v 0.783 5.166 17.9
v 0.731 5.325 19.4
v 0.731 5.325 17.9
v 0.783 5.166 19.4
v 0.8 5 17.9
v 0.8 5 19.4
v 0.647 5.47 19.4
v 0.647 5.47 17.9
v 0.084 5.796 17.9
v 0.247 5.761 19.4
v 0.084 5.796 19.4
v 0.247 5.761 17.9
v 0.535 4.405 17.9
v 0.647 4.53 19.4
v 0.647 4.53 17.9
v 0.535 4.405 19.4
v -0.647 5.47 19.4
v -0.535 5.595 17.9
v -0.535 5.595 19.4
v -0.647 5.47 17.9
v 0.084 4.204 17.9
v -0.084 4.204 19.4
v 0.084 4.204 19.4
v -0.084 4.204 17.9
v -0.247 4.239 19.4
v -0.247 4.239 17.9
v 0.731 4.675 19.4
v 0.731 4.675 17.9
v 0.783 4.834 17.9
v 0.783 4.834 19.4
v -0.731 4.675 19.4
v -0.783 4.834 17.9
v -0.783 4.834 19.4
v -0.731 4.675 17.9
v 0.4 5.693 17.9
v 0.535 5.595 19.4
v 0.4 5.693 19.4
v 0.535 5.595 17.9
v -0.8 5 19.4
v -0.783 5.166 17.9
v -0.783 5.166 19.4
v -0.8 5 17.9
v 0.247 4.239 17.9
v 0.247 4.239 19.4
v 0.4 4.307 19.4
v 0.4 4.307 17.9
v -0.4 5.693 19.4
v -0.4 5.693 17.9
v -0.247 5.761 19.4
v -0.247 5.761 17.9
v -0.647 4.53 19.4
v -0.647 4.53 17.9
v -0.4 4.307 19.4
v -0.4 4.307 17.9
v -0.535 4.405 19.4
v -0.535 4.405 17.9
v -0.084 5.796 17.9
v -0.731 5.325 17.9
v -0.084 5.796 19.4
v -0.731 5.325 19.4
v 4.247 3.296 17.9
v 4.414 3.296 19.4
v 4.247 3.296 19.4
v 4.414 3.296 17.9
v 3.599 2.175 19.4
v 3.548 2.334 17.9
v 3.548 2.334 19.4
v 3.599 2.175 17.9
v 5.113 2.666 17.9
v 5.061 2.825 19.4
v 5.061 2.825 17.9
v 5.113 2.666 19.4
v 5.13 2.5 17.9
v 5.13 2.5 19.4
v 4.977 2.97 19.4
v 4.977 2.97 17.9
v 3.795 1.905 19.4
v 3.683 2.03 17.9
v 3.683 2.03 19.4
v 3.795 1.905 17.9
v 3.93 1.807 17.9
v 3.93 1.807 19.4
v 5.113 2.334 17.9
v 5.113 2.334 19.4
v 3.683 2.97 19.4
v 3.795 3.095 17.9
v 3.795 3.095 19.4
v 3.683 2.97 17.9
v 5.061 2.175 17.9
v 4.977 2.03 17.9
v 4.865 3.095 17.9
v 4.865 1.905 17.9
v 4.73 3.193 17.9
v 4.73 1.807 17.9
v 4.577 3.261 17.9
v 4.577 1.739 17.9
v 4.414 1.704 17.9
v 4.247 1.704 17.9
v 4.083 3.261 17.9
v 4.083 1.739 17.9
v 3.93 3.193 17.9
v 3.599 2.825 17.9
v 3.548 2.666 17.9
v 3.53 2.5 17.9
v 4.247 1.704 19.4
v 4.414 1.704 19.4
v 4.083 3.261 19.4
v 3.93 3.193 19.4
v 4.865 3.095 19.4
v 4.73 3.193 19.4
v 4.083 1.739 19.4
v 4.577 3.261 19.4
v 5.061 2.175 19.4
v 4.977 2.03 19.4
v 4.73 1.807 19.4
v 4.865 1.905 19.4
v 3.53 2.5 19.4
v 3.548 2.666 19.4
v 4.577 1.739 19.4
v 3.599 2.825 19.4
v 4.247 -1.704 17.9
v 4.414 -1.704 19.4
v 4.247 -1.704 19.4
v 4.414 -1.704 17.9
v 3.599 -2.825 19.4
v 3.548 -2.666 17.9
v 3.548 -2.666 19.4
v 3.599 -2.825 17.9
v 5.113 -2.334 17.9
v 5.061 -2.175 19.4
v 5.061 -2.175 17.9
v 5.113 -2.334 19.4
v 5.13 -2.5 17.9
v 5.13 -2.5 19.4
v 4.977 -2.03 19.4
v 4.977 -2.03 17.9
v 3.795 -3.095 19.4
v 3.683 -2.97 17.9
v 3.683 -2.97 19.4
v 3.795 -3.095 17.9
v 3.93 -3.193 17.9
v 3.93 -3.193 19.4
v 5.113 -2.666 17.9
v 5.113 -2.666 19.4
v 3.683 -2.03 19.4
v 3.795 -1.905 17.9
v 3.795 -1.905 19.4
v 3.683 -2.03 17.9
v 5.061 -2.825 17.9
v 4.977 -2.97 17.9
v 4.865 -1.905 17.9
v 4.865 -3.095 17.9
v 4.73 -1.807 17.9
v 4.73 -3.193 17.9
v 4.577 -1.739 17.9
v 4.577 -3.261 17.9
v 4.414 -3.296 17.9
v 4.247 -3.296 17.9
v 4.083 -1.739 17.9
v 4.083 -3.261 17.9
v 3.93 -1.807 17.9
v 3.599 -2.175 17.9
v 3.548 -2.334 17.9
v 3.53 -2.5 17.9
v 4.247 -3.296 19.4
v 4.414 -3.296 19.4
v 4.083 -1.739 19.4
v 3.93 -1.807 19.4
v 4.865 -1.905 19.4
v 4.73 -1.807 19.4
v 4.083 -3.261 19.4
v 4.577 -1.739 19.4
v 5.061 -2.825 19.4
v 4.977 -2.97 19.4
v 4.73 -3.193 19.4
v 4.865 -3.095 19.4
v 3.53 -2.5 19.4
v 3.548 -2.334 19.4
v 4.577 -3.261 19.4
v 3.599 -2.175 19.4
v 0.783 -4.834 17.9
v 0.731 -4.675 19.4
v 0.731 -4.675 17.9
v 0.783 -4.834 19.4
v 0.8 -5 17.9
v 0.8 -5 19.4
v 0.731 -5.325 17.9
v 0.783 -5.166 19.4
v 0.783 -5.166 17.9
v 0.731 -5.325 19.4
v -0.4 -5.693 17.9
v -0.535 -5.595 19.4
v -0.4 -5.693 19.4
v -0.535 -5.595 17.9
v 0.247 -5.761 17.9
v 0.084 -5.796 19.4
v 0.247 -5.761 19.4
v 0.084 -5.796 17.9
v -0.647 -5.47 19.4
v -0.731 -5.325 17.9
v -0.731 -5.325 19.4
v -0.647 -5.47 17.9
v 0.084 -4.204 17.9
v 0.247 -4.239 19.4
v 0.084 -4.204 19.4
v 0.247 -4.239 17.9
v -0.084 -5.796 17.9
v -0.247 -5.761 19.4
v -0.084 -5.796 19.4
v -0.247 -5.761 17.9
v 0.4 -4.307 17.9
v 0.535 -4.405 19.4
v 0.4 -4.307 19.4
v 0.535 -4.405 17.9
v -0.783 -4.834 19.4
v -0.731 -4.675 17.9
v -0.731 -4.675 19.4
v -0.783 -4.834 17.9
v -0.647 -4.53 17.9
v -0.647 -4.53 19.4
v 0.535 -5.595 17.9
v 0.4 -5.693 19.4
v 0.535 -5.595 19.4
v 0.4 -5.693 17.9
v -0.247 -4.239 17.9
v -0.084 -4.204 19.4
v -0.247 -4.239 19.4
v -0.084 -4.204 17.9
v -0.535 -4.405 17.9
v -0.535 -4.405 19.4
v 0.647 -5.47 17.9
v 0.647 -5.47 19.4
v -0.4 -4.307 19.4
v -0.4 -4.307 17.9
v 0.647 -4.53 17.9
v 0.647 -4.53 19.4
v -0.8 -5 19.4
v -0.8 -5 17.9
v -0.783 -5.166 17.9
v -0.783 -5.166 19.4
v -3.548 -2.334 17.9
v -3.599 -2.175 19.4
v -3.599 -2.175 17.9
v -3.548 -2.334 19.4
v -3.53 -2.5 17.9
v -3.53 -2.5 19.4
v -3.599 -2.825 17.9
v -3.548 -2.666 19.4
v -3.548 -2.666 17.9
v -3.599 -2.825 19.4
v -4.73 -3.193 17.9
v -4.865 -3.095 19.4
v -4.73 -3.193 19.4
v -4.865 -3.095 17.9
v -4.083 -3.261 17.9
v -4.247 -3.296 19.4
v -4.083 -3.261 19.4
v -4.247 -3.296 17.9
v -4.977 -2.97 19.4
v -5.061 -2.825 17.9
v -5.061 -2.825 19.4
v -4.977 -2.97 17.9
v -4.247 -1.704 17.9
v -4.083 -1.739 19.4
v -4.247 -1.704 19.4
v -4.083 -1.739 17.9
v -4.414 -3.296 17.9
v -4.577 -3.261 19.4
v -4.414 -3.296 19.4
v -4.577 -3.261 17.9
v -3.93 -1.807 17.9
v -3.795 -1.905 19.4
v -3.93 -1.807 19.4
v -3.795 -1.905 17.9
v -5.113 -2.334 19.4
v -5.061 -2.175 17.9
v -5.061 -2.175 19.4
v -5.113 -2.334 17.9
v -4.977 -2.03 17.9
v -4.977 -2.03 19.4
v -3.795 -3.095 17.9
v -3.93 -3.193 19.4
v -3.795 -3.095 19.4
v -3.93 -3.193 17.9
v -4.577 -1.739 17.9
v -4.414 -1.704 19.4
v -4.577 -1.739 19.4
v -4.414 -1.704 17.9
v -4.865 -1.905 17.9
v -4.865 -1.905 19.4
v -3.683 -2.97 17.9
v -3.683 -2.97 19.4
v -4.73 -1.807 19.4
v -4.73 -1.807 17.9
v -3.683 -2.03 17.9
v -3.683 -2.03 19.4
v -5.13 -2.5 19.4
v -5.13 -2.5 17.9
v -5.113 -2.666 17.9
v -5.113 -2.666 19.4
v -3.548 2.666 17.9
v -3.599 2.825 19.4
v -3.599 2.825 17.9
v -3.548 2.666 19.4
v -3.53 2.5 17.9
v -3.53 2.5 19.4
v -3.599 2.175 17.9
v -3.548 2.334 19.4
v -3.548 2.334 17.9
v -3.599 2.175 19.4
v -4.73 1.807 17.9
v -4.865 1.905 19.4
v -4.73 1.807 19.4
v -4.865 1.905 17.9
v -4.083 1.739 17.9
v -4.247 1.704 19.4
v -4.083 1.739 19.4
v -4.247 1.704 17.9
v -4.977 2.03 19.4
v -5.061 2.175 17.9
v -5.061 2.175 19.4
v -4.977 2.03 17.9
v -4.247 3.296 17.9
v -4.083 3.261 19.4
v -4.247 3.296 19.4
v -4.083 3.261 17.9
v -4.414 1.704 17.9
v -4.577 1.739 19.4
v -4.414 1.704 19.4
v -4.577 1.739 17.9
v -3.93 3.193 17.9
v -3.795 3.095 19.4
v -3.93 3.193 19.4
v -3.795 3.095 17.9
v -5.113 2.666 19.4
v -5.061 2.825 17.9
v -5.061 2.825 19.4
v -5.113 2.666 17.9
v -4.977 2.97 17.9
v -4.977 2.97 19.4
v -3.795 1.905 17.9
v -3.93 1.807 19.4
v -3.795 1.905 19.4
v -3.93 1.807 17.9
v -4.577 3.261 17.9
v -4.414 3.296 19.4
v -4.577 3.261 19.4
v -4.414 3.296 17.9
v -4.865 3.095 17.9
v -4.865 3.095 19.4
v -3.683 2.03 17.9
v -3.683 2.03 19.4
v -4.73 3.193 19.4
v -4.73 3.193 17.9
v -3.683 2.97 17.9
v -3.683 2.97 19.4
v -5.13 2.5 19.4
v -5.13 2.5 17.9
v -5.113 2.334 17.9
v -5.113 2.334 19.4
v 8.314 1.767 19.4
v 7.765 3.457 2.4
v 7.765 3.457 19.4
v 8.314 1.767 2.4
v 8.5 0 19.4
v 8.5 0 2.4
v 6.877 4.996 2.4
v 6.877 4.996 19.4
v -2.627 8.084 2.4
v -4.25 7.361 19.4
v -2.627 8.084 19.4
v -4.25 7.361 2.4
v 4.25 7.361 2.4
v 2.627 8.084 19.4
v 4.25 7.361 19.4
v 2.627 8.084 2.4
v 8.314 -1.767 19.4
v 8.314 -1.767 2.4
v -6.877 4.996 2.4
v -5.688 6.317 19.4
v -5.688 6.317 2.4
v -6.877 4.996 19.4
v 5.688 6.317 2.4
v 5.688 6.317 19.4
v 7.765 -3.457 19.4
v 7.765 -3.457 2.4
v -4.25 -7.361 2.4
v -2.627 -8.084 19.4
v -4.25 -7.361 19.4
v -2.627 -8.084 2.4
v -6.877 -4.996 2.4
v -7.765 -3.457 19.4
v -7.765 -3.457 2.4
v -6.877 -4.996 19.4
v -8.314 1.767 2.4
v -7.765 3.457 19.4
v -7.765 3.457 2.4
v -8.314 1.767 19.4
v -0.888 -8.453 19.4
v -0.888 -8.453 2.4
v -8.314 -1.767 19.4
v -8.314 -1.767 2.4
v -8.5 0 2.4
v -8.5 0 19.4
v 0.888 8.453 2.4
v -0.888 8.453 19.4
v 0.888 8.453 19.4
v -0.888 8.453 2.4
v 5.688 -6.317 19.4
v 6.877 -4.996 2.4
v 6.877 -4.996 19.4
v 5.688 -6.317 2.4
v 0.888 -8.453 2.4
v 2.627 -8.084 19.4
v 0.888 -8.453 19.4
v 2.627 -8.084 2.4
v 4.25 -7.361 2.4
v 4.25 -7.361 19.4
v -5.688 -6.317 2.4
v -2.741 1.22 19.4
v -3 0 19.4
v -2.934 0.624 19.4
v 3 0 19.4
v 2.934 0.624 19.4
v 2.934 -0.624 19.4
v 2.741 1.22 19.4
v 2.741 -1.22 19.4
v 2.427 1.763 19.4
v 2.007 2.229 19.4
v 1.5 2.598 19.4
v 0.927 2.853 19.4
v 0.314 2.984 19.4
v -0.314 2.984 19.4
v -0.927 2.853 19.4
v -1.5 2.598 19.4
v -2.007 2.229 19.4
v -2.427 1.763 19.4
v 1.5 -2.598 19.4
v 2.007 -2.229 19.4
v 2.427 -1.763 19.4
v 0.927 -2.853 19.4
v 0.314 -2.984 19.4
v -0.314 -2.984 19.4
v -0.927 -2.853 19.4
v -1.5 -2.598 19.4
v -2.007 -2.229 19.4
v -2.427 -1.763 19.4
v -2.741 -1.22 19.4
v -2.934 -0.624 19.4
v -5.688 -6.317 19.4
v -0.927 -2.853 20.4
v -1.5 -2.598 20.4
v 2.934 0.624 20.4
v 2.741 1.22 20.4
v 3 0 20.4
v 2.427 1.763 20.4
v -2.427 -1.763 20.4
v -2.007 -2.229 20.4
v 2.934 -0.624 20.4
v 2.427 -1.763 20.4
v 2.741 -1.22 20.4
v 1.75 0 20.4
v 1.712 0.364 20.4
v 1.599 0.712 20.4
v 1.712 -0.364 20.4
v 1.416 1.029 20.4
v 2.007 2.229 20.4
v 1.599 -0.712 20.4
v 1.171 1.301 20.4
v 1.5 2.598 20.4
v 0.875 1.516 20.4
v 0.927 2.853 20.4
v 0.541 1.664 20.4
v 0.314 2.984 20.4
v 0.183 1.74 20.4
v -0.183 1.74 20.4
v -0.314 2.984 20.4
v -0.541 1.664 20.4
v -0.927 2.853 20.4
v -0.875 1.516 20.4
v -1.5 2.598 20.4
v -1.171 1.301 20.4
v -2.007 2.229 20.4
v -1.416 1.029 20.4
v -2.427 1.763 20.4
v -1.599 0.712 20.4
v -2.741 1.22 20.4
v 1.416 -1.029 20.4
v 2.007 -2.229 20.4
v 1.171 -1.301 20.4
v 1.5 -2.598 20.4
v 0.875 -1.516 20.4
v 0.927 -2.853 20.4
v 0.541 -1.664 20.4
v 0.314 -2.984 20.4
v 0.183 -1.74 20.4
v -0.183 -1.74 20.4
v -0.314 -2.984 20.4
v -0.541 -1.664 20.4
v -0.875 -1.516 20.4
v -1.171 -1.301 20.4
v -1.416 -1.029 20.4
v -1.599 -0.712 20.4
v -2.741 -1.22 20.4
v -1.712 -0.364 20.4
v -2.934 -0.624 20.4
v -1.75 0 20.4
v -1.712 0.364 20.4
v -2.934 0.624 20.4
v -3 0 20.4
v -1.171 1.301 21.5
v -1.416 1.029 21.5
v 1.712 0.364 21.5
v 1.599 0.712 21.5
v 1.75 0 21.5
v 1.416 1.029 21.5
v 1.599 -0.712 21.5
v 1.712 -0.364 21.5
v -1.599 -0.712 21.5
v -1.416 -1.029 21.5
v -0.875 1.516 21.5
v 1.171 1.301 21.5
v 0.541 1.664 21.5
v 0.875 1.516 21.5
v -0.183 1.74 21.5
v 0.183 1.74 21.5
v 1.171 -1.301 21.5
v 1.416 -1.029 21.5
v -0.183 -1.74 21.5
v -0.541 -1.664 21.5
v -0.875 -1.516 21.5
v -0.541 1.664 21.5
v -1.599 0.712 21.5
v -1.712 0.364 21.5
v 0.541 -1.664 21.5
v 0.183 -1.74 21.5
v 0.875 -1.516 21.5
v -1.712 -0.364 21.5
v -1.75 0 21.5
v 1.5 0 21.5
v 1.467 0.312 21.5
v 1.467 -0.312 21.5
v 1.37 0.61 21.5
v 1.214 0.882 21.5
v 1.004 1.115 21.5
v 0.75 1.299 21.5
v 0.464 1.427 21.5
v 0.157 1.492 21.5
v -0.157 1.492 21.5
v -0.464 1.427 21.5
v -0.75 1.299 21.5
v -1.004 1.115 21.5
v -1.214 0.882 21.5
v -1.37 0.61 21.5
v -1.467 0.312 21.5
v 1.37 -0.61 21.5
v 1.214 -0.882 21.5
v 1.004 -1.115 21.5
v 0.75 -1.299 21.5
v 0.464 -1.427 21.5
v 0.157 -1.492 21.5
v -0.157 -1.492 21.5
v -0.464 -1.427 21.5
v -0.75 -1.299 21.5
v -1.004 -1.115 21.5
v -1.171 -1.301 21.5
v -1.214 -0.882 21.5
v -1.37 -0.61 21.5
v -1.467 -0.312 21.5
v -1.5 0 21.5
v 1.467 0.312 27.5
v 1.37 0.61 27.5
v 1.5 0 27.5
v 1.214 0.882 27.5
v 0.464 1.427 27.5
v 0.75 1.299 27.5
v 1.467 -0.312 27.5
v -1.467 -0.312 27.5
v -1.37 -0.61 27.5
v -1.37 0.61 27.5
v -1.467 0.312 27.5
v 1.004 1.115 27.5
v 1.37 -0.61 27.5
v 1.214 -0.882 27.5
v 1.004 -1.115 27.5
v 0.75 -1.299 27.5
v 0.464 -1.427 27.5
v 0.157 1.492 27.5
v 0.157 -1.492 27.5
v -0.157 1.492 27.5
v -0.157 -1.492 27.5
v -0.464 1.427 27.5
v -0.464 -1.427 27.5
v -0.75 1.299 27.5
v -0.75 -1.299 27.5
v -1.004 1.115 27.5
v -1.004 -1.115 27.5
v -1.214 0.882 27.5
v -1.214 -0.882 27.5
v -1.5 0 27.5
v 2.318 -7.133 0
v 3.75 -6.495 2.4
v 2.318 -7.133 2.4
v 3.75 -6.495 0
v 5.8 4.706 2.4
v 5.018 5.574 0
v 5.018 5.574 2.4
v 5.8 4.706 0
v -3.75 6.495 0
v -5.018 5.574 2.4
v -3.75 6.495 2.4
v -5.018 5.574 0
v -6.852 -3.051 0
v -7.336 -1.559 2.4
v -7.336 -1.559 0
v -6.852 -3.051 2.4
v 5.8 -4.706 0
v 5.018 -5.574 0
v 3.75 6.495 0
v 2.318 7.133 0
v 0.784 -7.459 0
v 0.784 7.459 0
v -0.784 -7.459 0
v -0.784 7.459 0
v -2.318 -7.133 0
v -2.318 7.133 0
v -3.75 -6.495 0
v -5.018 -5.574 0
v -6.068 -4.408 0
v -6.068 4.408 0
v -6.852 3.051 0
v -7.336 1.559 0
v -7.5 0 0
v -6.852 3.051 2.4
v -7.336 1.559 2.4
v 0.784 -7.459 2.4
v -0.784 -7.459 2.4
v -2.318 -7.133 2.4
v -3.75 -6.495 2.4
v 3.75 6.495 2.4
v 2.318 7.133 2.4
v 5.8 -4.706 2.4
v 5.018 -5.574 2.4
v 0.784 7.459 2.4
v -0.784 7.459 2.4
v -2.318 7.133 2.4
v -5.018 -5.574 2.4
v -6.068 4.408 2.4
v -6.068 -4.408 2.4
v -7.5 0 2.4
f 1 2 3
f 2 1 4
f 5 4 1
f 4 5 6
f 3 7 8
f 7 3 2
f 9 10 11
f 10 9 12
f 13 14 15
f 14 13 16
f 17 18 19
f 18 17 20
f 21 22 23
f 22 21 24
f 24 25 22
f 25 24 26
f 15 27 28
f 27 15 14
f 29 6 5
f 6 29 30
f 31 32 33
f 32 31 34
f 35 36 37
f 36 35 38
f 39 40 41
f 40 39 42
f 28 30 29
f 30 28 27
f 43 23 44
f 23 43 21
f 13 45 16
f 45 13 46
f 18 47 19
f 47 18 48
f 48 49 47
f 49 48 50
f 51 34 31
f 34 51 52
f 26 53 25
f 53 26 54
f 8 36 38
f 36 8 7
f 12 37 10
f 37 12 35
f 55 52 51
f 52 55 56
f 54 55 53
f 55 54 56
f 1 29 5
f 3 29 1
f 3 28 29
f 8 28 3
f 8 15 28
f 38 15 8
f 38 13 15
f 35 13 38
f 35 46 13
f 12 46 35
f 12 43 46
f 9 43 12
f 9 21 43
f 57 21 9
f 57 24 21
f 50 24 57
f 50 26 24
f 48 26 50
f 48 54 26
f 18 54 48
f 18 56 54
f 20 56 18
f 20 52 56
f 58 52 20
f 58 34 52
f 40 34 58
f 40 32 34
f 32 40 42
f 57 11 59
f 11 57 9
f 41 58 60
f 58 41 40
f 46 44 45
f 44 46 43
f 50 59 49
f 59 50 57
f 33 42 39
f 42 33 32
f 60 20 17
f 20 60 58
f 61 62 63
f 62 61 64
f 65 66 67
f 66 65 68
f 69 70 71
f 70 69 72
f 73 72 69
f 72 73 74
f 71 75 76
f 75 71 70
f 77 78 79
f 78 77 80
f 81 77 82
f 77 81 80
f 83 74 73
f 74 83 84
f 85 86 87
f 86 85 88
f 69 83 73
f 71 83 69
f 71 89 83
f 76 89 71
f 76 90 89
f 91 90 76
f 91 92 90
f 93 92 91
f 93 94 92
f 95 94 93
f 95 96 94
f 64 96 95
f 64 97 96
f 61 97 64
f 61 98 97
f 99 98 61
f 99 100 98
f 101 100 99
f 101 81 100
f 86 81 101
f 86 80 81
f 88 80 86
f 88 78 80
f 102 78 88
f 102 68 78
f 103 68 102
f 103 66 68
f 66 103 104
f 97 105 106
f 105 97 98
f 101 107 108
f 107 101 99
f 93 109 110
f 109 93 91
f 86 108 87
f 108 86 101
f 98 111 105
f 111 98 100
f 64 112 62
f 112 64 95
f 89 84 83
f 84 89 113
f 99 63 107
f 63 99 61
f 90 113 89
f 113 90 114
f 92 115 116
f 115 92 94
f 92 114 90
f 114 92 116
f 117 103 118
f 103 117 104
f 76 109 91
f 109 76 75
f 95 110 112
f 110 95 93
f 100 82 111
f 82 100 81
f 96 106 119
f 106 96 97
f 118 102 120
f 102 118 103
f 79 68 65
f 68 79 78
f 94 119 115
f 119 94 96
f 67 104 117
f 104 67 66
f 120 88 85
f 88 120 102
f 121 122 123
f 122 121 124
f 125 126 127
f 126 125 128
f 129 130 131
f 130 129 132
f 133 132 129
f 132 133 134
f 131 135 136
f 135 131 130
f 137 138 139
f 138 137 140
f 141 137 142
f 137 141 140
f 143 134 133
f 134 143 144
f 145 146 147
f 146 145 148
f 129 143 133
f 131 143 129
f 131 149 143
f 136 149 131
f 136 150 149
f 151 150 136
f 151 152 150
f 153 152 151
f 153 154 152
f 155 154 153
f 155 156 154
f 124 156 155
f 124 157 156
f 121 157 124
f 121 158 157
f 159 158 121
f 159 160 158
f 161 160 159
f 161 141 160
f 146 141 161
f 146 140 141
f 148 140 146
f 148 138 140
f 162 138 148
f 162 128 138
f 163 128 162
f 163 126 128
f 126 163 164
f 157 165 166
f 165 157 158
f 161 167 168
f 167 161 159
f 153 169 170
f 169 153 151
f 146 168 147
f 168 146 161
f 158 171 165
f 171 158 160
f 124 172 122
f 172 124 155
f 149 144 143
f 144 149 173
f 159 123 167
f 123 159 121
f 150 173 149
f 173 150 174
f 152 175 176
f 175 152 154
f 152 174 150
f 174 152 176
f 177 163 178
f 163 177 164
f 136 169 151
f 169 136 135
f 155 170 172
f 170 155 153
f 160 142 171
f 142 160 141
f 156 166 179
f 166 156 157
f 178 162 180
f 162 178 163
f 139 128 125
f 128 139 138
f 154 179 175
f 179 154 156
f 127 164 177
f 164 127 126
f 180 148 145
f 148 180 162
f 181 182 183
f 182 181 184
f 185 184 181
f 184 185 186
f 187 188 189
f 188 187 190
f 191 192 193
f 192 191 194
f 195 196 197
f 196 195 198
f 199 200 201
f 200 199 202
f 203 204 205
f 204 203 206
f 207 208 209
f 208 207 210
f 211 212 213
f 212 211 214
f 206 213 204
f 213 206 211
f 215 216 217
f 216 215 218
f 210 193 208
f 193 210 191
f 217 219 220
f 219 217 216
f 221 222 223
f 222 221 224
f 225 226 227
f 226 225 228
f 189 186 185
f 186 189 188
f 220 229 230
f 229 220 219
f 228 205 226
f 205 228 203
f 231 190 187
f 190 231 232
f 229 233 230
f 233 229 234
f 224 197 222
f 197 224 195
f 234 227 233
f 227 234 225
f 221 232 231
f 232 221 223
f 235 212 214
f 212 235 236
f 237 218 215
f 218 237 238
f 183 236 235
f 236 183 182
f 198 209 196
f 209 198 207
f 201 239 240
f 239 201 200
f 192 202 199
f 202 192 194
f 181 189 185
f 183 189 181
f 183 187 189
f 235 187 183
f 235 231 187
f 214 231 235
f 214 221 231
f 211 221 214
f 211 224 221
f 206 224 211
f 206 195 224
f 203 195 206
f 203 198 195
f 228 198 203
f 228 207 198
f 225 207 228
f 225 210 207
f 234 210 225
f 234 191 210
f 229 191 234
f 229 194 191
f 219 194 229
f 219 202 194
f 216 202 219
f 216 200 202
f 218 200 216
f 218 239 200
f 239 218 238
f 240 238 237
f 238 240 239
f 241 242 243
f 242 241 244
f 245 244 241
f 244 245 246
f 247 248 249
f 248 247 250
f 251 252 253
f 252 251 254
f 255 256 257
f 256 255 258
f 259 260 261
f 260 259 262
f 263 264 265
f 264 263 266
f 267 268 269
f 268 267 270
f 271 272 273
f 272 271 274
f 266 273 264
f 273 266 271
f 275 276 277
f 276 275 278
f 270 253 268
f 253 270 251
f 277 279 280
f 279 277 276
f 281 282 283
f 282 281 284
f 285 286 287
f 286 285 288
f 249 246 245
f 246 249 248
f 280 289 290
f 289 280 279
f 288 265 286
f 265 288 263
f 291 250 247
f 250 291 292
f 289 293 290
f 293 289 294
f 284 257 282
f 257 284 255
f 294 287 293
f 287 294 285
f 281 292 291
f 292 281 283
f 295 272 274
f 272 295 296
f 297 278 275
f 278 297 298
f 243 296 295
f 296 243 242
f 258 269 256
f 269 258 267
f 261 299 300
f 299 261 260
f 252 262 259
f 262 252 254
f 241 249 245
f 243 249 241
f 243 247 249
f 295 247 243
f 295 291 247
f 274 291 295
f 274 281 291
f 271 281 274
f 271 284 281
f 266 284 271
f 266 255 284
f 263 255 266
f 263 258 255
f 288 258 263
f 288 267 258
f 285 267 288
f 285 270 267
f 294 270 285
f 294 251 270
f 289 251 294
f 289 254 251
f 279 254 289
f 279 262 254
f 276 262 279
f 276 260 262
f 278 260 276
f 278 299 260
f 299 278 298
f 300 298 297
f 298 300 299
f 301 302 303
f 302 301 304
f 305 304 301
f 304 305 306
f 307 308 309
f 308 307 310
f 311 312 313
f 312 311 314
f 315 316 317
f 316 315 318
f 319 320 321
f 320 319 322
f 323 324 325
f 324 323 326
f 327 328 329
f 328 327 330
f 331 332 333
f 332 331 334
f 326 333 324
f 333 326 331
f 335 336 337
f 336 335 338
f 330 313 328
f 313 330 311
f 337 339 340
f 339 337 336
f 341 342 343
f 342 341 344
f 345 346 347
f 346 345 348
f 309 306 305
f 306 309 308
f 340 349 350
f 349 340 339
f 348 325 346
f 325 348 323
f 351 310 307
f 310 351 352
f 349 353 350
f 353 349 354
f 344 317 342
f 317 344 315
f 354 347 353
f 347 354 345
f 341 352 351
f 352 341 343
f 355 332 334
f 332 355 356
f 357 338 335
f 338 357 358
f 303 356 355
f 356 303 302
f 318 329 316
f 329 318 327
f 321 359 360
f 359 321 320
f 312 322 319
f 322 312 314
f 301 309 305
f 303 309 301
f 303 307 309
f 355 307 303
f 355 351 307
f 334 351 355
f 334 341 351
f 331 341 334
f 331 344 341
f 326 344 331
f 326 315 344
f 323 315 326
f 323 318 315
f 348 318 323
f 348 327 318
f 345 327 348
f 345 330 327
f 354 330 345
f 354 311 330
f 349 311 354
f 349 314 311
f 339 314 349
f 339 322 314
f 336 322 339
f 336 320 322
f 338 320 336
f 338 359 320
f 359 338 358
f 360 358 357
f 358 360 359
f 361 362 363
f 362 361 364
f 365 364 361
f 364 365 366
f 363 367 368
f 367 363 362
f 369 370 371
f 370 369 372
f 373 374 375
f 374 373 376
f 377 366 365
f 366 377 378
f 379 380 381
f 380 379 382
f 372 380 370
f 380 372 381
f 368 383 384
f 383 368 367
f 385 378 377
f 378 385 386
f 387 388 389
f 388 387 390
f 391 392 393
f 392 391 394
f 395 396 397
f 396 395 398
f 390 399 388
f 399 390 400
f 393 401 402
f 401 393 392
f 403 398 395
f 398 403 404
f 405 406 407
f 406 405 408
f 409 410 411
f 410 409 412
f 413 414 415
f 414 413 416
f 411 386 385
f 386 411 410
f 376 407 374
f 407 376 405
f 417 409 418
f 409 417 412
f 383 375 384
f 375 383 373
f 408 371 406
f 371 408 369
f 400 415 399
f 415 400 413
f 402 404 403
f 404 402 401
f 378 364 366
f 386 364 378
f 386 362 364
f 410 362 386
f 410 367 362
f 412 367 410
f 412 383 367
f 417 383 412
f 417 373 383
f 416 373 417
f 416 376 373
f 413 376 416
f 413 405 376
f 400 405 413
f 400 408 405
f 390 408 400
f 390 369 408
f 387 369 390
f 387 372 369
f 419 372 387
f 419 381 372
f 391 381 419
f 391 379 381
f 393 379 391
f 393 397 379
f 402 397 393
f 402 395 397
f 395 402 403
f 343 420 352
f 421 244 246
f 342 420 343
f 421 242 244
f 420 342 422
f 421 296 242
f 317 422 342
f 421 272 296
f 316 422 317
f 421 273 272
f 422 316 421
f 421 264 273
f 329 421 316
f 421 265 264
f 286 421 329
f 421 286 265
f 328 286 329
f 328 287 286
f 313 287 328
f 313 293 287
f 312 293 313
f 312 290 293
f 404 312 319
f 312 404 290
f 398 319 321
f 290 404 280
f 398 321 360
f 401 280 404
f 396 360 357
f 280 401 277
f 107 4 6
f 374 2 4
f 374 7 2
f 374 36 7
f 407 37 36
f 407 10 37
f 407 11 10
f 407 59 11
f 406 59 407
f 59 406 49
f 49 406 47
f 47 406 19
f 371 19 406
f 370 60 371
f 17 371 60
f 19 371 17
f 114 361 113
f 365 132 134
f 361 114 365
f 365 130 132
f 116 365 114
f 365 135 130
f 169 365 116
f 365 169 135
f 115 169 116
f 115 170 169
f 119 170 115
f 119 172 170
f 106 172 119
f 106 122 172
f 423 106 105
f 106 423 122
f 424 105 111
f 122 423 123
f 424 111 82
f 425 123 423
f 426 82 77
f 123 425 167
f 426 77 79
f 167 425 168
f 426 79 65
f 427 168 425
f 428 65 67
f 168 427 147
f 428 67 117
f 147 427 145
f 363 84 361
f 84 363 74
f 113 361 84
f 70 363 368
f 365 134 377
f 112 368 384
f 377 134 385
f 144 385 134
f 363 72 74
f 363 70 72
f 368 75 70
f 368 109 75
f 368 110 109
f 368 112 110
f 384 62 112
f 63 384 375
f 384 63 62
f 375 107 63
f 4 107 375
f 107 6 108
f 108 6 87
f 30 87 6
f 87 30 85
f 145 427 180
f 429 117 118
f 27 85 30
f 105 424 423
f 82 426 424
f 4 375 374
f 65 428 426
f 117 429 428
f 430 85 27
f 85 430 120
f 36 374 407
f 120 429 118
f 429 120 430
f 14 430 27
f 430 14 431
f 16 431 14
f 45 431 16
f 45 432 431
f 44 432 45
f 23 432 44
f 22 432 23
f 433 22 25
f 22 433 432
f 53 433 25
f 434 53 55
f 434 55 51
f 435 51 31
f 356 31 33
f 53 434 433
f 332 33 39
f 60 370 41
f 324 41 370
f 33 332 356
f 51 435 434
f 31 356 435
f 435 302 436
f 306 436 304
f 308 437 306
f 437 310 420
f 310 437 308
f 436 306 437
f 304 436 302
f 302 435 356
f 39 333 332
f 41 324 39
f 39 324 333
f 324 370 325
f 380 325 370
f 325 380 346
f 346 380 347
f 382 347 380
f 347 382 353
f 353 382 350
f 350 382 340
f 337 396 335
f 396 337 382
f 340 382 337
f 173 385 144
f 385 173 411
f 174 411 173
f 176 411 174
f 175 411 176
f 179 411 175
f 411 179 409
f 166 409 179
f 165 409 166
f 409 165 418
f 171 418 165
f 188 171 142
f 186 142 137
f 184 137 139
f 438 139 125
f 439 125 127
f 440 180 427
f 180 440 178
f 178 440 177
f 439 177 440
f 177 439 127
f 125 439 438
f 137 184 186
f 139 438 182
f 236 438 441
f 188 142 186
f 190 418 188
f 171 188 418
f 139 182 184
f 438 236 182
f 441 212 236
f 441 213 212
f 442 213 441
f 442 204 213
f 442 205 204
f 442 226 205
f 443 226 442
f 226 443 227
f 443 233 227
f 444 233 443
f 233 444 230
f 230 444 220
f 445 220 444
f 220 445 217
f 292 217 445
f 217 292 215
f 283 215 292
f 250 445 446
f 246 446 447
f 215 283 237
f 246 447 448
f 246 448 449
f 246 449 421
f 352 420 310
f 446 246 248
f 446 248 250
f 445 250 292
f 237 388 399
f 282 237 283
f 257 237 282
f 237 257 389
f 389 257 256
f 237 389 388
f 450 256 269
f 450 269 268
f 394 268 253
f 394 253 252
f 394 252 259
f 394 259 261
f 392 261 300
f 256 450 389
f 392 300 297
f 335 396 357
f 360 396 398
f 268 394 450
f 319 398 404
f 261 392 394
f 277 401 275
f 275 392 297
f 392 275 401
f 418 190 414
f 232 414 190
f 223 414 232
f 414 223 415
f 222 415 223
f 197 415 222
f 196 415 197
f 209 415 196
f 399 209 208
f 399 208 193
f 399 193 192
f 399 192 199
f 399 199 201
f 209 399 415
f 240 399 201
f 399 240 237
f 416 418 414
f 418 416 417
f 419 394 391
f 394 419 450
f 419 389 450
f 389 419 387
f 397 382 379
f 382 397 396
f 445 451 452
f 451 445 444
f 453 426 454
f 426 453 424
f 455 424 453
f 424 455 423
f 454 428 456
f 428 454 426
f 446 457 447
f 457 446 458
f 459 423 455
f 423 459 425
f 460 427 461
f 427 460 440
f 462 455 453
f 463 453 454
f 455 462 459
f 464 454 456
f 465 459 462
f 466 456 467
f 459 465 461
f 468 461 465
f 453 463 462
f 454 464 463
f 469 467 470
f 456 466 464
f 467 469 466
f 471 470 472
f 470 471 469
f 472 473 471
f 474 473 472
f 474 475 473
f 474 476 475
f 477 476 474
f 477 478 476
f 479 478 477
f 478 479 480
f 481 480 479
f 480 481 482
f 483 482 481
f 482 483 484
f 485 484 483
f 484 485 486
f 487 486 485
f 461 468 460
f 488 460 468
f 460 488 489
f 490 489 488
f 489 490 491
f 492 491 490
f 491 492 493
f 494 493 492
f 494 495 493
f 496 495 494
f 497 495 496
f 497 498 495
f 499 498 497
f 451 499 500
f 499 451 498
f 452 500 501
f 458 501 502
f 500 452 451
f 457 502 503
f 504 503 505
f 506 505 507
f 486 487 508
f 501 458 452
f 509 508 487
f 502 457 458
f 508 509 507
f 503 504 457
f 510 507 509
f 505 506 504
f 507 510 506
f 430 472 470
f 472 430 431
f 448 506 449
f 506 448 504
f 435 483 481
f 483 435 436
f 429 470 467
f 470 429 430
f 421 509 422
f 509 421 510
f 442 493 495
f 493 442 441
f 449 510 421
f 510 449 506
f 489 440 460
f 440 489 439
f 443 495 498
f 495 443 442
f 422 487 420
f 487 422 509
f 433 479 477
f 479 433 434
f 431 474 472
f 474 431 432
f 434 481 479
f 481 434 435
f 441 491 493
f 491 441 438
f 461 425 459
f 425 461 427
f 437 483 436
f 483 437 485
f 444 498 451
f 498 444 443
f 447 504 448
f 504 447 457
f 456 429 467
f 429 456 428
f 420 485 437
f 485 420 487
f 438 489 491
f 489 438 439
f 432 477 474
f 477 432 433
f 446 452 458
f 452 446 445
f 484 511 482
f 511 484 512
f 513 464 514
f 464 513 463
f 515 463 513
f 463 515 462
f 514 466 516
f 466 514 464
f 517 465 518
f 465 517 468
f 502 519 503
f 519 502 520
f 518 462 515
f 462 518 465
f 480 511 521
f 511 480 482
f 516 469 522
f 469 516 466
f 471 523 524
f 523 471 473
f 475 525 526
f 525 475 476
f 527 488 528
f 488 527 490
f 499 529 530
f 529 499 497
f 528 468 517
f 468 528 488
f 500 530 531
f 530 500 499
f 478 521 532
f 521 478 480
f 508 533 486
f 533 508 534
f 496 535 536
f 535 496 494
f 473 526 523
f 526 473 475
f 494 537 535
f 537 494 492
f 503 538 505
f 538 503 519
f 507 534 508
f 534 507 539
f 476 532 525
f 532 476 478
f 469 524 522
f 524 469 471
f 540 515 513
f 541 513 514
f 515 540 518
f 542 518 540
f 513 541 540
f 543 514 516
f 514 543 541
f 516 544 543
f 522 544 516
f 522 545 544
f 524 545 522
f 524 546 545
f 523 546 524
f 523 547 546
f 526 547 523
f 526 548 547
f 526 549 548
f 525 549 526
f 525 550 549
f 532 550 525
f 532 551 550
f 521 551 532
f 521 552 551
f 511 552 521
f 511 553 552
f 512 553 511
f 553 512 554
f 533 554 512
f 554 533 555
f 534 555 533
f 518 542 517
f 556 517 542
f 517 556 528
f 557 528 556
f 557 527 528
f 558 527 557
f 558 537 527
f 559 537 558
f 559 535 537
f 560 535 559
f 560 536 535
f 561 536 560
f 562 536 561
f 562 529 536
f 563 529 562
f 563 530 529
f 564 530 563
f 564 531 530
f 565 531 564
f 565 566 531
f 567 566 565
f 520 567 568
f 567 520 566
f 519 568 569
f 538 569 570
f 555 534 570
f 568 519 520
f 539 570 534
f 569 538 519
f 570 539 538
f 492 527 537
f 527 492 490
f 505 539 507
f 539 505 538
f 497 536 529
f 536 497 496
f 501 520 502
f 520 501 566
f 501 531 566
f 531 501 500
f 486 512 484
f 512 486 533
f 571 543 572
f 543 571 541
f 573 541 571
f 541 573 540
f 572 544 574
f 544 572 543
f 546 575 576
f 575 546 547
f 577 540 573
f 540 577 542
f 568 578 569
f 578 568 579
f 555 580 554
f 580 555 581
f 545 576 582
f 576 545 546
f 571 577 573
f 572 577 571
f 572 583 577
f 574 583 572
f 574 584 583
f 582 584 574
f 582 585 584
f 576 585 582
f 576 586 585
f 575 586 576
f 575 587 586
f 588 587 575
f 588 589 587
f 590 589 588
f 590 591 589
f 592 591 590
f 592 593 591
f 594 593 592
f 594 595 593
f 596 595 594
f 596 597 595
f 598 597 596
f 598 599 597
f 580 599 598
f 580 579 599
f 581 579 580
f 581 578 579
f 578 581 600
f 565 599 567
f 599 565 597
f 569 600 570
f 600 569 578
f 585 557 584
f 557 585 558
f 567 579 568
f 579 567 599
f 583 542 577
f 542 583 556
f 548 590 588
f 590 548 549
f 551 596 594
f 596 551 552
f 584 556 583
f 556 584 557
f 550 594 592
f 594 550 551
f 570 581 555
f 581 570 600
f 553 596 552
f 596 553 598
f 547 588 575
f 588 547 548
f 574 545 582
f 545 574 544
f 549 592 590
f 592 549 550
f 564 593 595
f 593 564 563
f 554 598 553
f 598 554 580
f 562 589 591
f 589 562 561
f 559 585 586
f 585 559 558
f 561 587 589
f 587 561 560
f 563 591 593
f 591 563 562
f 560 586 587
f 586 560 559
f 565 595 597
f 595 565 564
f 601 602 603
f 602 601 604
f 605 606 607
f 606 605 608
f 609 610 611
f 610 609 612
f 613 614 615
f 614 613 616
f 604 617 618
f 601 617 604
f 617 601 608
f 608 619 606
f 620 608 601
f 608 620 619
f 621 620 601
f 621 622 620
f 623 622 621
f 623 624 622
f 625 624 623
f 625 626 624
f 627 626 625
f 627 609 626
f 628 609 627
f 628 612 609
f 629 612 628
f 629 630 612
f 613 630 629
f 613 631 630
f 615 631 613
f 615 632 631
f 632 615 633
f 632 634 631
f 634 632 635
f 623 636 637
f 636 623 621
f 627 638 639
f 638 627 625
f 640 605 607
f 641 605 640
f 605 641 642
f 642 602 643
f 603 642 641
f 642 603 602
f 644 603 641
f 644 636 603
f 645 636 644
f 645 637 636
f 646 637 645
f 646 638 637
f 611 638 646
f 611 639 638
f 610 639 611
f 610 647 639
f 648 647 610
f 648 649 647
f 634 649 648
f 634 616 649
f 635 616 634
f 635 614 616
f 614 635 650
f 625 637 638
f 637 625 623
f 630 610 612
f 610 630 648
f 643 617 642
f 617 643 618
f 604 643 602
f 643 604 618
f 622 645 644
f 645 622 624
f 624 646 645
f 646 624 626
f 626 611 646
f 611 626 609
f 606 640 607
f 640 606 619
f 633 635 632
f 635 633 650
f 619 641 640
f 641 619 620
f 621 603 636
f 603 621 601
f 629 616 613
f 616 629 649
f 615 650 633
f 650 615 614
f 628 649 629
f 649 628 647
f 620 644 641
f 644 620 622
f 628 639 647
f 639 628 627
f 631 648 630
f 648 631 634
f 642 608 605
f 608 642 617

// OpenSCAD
//motor 1717 modeling
//https://www.shinkoh-faulhaber.jp/JP_data_edition_2020/JP_IEH2-4096_DFF.pdf
//https://www.shinkoh-faulhaber.jp/products/series/1717sr
//Author Y.Nakagawa
//Date: 2024/12/07

motor1717();

module motor1717(){
el=2.4; //encoder height with encoder 19.4(mm)

    translate([0,0,el])color("silver") motor1717_body();
    color("black")motor1717_encoder();
}

module motor1717_screwhole(hscrew, rscrew, rcircle, bheight){
    for(angle=[0:60:360]){
        translate([rcircle*sin(angle),rcircle*cos(angle),bheight])
            cylinder(h=hscrew, r=rscrew);
    }
}

module motor1717_body(){
$fs=0.01;
fl = 17;//17; //faulharber1717 17height 
fr = (17/2);
sl = 1.6; //screw length 1.6(mm)
sr = 0.8; //screw hole 0.3(mm)
a1r=3; //axis sholder base 1 6mm diameter
a2r=1.75; //axis sholder base 2 3.5mm diameter
a1h=1; //height is measured from body
a2h=2.1; //height is from body
ar=1.5;//axis diameter 1.5mm
ah=8.1;//height is measured from body
    
  
difference(){
    cylinder(h=fl, r=fr);
    motor1717_screwhole(sl, sr, 5, fl-sl+0.1);
}

translate([0,0, fl])
    cylinder(h=a1h, r=a1r);
translate([0,0,fl])
    cylinder(h=a2h, r=a2r);
translate([0,0,fl])
    cylinder(h=ah, r=ar);
}

module motor1717_encoder(){
$fs=0.01;
el=2.4; //encoder height with encoder 19.4(mm)
er=(15/2);
    difference(){
        cylinder(h=el, r=er);
        translate([5.8, -10,-3])
        cube([17,20,el+5]);
    }
}


//color("red") screwhole(sl, sr, 5, fl-sl+0.1);
